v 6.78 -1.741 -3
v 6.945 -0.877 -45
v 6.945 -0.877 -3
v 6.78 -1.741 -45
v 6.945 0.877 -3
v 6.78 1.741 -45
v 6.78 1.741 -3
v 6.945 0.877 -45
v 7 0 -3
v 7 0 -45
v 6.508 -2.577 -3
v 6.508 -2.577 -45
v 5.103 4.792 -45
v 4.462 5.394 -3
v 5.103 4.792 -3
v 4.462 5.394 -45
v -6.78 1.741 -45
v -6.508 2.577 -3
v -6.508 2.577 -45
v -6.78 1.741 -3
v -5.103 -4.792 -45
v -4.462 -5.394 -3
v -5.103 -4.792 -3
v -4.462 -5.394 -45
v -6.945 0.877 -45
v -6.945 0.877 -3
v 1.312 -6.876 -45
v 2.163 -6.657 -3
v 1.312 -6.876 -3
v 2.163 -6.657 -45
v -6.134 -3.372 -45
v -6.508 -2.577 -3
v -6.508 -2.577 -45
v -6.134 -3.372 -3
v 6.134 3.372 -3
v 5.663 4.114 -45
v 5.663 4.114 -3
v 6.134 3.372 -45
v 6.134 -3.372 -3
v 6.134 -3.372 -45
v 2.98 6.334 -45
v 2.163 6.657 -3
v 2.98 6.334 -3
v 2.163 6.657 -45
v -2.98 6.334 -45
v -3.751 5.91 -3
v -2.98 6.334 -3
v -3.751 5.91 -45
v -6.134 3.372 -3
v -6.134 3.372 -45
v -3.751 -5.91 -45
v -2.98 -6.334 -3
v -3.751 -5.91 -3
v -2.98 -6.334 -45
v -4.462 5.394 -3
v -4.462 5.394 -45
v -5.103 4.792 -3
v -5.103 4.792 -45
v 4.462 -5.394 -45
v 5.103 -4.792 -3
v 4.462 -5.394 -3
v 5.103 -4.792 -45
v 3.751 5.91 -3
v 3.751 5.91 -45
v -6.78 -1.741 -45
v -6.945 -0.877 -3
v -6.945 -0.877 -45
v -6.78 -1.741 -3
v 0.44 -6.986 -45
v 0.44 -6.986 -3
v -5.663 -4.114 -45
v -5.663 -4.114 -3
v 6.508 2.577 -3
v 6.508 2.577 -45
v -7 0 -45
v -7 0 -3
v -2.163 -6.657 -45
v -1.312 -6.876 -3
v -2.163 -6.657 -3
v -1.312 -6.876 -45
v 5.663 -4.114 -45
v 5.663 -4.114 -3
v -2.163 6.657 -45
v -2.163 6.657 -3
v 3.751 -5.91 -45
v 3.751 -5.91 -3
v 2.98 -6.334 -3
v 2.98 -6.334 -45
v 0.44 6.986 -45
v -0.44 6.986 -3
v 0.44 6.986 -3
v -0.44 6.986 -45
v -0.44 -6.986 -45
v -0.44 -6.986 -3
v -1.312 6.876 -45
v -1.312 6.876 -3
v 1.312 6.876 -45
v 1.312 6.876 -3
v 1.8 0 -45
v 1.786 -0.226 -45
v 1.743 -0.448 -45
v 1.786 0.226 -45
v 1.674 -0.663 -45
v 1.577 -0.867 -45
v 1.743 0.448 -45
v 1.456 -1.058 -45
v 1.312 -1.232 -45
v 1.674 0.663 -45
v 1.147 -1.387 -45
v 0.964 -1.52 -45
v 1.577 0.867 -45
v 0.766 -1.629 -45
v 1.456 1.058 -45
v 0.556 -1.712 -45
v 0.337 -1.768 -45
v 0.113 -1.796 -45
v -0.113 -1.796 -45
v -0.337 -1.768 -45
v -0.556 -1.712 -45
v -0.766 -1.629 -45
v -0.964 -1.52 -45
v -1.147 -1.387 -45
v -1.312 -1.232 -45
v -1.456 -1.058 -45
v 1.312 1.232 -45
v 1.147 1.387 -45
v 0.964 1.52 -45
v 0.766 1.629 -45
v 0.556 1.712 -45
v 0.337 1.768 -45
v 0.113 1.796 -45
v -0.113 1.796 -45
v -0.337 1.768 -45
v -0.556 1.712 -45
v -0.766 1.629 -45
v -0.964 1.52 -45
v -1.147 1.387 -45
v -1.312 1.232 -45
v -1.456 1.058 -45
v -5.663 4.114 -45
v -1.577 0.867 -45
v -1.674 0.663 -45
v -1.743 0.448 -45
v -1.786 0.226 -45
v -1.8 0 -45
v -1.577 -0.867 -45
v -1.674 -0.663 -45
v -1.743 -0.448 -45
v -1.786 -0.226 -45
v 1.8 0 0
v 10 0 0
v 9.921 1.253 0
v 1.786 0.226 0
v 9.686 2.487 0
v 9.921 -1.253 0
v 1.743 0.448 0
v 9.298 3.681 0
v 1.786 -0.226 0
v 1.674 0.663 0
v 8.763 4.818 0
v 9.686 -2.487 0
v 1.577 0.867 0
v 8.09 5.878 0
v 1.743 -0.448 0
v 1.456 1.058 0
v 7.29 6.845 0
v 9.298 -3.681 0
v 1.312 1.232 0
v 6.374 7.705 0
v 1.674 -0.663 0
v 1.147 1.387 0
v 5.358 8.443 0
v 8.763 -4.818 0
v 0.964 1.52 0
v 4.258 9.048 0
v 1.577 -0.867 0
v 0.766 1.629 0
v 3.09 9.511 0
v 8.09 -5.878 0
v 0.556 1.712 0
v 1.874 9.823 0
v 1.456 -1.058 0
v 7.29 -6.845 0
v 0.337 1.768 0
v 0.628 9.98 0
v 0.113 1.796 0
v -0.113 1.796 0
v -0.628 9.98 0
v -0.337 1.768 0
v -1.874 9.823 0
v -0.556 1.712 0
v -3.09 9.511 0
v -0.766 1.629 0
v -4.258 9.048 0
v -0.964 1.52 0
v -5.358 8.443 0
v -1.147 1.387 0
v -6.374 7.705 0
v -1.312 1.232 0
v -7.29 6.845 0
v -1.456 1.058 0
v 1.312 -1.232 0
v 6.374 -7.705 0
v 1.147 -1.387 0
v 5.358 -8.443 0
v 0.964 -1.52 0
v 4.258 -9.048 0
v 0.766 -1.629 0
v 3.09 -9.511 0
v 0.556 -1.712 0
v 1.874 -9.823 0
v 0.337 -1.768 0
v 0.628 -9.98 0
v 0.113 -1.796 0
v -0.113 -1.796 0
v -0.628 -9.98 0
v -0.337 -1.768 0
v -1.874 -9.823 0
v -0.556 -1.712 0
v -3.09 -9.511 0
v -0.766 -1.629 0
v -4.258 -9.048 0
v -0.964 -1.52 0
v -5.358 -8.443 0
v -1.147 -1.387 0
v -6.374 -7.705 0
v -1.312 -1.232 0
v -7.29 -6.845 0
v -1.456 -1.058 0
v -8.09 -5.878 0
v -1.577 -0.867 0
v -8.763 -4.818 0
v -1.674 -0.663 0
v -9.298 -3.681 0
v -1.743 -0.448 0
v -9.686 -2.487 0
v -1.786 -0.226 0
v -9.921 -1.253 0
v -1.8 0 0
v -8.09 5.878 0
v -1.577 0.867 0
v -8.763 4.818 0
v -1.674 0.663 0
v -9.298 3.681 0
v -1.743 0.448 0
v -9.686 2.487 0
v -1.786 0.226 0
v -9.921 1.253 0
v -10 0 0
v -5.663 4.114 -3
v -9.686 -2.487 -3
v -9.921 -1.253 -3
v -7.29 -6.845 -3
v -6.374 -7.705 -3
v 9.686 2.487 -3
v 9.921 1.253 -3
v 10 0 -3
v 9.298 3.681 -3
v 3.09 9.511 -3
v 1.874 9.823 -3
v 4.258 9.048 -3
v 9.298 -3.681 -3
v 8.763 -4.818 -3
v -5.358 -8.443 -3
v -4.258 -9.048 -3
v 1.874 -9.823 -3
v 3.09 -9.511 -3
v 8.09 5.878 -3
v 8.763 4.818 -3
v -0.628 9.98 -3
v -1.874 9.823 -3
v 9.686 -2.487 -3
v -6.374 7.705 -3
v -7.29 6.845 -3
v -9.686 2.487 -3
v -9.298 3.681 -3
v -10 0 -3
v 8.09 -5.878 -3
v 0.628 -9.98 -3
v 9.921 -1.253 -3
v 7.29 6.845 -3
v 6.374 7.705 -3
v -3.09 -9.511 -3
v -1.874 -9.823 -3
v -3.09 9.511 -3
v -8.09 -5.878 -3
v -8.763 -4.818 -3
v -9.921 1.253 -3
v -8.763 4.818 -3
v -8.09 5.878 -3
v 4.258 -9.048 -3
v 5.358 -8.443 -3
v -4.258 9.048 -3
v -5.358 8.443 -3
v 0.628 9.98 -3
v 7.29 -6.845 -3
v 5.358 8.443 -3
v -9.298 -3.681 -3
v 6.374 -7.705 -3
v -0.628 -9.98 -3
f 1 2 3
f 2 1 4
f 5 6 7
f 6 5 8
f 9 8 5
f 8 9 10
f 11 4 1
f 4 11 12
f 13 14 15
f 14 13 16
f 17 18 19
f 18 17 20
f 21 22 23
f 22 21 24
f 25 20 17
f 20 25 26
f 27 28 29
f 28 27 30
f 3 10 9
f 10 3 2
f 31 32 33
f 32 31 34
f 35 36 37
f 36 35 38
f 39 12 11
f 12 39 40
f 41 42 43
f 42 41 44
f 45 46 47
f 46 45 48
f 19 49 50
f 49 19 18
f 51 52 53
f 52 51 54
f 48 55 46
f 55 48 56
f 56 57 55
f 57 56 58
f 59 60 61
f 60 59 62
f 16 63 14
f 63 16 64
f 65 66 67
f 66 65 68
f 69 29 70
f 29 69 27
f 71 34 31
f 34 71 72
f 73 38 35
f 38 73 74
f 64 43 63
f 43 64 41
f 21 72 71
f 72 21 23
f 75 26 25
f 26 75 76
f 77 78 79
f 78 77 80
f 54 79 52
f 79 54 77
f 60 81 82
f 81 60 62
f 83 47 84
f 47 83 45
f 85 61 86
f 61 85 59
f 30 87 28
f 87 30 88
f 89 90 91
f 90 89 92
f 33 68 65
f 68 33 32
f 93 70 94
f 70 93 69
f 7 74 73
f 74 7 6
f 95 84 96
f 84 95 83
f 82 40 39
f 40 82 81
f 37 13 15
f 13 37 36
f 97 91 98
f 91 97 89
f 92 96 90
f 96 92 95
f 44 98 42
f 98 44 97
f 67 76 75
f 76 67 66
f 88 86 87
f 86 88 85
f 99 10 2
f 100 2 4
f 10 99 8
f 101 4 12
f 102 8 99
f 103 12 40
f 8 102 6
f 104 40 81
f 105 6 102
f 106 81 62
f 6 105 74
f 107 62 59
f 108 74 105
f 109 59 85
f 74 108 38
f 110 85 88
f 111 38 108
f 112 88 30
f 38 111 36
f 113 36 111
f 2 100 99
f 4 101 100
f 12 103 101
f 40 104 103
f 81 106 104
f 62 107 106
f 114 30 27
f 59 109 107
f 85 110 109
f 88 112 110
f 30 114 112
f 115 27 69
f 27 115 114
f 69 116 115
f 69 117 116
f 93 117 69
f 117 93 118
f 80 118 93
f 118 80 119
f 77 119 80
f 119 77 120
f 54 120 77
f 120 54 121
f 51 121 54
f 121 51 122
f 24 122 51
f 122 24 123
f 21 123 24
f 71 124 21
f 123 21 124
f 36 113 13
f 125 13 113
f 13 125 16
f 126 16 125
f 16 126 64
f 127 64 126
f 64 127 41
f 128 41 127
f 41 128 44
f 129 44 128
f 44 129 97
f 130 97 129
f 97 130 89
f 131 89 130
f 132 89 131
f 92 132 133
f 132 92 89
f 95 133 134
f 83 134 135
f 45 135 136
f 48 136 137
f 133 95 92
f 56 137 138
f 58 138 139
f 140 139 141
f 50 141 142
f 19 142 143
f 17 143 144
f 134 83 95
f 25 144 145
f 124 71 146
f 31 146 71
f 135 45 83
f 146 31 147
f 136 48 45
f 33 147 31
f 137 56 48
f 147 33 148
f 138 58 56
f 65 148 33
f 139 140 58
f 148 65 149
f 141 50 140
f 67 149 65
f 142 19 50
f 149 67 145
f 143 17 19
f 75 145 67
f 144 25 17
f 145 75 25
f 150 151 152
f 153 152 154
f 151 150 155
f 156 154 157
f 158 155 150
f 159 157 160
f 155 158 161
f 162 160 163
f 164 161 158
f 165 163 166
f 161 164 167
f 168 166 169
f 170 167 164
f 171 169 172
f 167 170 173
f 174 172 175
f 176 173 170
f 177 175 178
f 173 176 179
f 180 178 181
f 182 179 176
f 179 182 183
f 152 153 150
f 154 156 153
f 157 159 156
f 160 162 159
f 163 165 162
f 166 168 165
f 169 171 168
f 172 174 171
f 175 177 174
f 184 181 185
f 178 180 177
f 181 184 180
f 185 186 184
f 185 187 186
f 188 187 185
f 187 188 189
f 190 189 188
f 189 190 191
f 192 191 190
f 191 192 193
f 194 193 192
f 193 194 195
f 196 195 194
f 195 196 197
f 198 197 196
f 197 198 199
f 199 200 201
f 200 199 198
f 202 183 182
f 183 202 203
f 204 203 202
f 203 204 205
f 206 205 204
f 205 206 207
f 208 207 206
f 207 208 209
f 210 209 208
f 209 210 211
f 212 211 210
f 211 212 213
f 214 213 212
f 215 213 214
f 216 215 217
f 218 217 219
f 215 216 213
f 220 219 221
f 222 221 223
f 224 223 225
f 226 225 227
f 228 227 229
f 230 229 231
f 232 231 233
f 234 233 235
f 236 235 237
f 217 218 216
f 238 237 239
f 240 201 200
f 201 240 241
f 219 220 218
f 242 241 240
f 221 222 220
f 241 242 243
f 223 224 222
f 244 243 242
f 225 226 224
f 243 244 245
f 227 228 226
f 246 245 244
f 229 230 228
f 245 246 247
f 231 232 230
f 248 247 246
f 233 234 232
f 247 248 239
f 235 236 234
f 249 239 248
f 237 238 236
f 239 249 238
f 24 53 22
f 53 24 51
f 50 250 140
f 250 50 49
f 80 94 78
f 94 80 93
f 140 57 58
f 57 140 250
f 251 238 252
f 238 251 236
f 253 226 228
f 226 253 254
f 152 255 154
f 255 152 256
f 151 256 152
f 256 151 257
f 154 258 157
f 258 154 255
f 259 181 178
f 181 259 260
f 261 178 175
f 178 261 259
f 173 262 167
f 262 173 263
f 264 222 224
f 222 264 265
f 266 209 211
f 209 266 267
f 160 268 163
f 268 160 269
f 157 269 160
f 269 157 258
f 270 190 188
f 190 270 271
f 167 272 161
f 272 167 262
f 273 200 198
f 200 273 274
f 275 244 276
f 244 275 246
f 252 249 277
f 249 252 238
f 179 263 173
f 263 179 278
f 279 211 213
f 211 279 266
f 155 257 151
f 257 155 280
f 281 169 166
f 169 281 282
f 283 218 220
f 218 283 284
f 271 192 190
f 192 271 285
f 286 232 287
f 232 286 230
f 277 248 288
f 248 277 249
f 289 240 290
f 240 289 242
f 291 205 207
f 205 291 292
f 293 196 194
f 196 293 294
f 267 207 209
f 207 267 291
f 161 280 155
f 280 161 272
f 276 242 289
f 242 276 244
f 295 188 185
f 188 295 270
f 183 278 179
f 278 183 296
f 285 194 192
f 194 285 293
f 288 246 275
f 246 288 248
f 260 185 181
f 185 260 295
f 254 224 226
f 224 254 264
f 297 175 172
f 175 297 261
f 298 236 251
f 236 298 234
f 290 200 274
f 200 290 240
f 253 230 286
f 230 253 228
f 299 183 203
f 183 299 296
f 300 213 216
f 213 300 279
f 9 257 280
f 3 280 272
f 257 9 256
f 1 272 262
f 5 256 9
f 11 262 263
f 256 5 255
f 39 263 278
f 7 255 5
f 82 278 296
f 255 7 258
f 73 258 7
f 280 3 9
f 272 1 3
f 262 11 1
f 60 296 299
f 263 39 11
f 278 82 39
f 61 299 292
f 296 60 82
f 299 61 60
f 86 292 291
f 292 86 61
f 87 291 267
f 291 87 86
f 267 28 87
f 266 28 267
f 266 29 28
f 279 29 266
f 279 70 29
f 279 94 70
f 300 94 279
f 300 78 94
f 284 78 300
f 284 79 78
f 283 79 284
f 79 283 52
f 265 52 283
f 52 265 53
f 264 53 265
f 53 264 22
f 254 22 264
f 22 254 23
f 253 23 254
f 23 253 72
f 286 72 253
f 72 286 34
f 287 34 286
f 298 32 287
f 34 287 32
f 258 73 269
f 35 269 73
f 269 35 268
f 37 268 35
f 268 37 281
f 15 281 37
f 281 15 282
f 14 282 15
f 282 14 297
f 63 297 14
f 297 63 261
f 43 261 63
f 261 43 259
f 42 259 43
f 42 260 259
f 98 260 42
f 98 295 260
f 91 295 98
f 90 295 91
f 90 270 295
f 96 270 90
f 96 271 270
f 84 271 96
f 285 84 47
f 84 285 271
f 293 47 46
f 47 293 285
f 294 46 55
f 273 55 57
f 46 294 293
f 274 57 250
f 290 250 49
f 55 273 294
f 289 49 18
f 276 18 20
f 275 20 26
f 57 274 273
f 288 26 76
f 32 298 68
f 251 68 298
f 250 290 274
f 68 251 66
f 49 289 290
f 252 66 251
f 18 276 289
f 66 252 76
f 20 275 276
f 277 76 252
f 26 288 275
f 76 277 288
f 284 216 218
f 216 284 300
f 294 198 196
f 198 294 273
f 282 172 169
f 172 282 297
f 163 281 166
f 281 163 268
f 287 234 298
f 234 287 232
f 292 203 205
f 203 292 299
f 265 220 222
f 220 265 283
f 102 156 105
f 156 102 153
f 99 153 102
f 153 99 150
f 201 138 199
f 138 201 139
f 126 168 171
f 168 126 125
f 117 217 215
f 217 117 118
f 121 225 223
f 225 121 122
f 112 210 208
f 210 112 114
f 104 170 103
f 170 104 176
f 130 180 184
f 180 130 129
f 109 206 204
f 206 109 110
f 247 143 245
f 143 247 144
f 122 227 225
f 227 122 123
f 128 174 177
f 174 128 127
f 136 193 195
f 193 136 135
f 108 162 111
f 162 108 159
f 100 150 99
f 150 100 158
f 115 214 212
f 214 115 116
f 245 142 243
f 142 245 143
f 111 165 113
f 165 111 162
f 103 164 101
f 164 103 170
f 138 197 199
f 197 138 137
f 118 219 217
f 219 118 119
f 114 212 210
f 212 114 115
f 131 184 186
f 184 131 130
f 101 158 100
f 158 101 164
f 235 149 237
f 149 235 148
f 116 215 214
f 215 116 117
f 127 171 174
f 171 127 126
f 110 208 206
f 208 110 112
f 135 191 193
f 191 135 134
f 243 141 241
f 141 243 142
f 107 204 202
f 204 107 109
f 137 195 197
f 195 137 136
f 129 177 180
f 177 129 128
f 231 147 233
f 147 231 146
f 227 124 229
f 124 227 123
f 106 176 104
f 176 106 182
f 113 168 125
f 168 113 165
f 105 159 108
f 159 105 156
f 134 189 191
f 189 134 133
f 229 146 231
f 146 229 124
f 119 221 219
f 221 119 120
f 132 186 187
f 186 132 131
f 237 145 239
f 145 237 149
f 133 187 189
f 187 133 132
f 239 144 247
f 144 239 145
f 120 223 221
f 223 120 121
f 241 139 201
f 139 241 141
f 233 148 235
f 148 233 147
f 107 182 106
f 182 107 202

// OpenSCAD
$fn = 50;


difference() {
	union() {
		translate(v = [0, 0, -45.0000000000]) {
			cylinder(h = 45, r = 7.0000000000);
		}
		translate(v = [0, 0, -3.0000000000]) {
			cylinder(h = 3, r = 10.0000000000);
		}
	}
	union() {
		#translate(v = [0, 0, -45]) {
			cylinder(h = 45, r = 1.8000000000);
		}
	}
}
